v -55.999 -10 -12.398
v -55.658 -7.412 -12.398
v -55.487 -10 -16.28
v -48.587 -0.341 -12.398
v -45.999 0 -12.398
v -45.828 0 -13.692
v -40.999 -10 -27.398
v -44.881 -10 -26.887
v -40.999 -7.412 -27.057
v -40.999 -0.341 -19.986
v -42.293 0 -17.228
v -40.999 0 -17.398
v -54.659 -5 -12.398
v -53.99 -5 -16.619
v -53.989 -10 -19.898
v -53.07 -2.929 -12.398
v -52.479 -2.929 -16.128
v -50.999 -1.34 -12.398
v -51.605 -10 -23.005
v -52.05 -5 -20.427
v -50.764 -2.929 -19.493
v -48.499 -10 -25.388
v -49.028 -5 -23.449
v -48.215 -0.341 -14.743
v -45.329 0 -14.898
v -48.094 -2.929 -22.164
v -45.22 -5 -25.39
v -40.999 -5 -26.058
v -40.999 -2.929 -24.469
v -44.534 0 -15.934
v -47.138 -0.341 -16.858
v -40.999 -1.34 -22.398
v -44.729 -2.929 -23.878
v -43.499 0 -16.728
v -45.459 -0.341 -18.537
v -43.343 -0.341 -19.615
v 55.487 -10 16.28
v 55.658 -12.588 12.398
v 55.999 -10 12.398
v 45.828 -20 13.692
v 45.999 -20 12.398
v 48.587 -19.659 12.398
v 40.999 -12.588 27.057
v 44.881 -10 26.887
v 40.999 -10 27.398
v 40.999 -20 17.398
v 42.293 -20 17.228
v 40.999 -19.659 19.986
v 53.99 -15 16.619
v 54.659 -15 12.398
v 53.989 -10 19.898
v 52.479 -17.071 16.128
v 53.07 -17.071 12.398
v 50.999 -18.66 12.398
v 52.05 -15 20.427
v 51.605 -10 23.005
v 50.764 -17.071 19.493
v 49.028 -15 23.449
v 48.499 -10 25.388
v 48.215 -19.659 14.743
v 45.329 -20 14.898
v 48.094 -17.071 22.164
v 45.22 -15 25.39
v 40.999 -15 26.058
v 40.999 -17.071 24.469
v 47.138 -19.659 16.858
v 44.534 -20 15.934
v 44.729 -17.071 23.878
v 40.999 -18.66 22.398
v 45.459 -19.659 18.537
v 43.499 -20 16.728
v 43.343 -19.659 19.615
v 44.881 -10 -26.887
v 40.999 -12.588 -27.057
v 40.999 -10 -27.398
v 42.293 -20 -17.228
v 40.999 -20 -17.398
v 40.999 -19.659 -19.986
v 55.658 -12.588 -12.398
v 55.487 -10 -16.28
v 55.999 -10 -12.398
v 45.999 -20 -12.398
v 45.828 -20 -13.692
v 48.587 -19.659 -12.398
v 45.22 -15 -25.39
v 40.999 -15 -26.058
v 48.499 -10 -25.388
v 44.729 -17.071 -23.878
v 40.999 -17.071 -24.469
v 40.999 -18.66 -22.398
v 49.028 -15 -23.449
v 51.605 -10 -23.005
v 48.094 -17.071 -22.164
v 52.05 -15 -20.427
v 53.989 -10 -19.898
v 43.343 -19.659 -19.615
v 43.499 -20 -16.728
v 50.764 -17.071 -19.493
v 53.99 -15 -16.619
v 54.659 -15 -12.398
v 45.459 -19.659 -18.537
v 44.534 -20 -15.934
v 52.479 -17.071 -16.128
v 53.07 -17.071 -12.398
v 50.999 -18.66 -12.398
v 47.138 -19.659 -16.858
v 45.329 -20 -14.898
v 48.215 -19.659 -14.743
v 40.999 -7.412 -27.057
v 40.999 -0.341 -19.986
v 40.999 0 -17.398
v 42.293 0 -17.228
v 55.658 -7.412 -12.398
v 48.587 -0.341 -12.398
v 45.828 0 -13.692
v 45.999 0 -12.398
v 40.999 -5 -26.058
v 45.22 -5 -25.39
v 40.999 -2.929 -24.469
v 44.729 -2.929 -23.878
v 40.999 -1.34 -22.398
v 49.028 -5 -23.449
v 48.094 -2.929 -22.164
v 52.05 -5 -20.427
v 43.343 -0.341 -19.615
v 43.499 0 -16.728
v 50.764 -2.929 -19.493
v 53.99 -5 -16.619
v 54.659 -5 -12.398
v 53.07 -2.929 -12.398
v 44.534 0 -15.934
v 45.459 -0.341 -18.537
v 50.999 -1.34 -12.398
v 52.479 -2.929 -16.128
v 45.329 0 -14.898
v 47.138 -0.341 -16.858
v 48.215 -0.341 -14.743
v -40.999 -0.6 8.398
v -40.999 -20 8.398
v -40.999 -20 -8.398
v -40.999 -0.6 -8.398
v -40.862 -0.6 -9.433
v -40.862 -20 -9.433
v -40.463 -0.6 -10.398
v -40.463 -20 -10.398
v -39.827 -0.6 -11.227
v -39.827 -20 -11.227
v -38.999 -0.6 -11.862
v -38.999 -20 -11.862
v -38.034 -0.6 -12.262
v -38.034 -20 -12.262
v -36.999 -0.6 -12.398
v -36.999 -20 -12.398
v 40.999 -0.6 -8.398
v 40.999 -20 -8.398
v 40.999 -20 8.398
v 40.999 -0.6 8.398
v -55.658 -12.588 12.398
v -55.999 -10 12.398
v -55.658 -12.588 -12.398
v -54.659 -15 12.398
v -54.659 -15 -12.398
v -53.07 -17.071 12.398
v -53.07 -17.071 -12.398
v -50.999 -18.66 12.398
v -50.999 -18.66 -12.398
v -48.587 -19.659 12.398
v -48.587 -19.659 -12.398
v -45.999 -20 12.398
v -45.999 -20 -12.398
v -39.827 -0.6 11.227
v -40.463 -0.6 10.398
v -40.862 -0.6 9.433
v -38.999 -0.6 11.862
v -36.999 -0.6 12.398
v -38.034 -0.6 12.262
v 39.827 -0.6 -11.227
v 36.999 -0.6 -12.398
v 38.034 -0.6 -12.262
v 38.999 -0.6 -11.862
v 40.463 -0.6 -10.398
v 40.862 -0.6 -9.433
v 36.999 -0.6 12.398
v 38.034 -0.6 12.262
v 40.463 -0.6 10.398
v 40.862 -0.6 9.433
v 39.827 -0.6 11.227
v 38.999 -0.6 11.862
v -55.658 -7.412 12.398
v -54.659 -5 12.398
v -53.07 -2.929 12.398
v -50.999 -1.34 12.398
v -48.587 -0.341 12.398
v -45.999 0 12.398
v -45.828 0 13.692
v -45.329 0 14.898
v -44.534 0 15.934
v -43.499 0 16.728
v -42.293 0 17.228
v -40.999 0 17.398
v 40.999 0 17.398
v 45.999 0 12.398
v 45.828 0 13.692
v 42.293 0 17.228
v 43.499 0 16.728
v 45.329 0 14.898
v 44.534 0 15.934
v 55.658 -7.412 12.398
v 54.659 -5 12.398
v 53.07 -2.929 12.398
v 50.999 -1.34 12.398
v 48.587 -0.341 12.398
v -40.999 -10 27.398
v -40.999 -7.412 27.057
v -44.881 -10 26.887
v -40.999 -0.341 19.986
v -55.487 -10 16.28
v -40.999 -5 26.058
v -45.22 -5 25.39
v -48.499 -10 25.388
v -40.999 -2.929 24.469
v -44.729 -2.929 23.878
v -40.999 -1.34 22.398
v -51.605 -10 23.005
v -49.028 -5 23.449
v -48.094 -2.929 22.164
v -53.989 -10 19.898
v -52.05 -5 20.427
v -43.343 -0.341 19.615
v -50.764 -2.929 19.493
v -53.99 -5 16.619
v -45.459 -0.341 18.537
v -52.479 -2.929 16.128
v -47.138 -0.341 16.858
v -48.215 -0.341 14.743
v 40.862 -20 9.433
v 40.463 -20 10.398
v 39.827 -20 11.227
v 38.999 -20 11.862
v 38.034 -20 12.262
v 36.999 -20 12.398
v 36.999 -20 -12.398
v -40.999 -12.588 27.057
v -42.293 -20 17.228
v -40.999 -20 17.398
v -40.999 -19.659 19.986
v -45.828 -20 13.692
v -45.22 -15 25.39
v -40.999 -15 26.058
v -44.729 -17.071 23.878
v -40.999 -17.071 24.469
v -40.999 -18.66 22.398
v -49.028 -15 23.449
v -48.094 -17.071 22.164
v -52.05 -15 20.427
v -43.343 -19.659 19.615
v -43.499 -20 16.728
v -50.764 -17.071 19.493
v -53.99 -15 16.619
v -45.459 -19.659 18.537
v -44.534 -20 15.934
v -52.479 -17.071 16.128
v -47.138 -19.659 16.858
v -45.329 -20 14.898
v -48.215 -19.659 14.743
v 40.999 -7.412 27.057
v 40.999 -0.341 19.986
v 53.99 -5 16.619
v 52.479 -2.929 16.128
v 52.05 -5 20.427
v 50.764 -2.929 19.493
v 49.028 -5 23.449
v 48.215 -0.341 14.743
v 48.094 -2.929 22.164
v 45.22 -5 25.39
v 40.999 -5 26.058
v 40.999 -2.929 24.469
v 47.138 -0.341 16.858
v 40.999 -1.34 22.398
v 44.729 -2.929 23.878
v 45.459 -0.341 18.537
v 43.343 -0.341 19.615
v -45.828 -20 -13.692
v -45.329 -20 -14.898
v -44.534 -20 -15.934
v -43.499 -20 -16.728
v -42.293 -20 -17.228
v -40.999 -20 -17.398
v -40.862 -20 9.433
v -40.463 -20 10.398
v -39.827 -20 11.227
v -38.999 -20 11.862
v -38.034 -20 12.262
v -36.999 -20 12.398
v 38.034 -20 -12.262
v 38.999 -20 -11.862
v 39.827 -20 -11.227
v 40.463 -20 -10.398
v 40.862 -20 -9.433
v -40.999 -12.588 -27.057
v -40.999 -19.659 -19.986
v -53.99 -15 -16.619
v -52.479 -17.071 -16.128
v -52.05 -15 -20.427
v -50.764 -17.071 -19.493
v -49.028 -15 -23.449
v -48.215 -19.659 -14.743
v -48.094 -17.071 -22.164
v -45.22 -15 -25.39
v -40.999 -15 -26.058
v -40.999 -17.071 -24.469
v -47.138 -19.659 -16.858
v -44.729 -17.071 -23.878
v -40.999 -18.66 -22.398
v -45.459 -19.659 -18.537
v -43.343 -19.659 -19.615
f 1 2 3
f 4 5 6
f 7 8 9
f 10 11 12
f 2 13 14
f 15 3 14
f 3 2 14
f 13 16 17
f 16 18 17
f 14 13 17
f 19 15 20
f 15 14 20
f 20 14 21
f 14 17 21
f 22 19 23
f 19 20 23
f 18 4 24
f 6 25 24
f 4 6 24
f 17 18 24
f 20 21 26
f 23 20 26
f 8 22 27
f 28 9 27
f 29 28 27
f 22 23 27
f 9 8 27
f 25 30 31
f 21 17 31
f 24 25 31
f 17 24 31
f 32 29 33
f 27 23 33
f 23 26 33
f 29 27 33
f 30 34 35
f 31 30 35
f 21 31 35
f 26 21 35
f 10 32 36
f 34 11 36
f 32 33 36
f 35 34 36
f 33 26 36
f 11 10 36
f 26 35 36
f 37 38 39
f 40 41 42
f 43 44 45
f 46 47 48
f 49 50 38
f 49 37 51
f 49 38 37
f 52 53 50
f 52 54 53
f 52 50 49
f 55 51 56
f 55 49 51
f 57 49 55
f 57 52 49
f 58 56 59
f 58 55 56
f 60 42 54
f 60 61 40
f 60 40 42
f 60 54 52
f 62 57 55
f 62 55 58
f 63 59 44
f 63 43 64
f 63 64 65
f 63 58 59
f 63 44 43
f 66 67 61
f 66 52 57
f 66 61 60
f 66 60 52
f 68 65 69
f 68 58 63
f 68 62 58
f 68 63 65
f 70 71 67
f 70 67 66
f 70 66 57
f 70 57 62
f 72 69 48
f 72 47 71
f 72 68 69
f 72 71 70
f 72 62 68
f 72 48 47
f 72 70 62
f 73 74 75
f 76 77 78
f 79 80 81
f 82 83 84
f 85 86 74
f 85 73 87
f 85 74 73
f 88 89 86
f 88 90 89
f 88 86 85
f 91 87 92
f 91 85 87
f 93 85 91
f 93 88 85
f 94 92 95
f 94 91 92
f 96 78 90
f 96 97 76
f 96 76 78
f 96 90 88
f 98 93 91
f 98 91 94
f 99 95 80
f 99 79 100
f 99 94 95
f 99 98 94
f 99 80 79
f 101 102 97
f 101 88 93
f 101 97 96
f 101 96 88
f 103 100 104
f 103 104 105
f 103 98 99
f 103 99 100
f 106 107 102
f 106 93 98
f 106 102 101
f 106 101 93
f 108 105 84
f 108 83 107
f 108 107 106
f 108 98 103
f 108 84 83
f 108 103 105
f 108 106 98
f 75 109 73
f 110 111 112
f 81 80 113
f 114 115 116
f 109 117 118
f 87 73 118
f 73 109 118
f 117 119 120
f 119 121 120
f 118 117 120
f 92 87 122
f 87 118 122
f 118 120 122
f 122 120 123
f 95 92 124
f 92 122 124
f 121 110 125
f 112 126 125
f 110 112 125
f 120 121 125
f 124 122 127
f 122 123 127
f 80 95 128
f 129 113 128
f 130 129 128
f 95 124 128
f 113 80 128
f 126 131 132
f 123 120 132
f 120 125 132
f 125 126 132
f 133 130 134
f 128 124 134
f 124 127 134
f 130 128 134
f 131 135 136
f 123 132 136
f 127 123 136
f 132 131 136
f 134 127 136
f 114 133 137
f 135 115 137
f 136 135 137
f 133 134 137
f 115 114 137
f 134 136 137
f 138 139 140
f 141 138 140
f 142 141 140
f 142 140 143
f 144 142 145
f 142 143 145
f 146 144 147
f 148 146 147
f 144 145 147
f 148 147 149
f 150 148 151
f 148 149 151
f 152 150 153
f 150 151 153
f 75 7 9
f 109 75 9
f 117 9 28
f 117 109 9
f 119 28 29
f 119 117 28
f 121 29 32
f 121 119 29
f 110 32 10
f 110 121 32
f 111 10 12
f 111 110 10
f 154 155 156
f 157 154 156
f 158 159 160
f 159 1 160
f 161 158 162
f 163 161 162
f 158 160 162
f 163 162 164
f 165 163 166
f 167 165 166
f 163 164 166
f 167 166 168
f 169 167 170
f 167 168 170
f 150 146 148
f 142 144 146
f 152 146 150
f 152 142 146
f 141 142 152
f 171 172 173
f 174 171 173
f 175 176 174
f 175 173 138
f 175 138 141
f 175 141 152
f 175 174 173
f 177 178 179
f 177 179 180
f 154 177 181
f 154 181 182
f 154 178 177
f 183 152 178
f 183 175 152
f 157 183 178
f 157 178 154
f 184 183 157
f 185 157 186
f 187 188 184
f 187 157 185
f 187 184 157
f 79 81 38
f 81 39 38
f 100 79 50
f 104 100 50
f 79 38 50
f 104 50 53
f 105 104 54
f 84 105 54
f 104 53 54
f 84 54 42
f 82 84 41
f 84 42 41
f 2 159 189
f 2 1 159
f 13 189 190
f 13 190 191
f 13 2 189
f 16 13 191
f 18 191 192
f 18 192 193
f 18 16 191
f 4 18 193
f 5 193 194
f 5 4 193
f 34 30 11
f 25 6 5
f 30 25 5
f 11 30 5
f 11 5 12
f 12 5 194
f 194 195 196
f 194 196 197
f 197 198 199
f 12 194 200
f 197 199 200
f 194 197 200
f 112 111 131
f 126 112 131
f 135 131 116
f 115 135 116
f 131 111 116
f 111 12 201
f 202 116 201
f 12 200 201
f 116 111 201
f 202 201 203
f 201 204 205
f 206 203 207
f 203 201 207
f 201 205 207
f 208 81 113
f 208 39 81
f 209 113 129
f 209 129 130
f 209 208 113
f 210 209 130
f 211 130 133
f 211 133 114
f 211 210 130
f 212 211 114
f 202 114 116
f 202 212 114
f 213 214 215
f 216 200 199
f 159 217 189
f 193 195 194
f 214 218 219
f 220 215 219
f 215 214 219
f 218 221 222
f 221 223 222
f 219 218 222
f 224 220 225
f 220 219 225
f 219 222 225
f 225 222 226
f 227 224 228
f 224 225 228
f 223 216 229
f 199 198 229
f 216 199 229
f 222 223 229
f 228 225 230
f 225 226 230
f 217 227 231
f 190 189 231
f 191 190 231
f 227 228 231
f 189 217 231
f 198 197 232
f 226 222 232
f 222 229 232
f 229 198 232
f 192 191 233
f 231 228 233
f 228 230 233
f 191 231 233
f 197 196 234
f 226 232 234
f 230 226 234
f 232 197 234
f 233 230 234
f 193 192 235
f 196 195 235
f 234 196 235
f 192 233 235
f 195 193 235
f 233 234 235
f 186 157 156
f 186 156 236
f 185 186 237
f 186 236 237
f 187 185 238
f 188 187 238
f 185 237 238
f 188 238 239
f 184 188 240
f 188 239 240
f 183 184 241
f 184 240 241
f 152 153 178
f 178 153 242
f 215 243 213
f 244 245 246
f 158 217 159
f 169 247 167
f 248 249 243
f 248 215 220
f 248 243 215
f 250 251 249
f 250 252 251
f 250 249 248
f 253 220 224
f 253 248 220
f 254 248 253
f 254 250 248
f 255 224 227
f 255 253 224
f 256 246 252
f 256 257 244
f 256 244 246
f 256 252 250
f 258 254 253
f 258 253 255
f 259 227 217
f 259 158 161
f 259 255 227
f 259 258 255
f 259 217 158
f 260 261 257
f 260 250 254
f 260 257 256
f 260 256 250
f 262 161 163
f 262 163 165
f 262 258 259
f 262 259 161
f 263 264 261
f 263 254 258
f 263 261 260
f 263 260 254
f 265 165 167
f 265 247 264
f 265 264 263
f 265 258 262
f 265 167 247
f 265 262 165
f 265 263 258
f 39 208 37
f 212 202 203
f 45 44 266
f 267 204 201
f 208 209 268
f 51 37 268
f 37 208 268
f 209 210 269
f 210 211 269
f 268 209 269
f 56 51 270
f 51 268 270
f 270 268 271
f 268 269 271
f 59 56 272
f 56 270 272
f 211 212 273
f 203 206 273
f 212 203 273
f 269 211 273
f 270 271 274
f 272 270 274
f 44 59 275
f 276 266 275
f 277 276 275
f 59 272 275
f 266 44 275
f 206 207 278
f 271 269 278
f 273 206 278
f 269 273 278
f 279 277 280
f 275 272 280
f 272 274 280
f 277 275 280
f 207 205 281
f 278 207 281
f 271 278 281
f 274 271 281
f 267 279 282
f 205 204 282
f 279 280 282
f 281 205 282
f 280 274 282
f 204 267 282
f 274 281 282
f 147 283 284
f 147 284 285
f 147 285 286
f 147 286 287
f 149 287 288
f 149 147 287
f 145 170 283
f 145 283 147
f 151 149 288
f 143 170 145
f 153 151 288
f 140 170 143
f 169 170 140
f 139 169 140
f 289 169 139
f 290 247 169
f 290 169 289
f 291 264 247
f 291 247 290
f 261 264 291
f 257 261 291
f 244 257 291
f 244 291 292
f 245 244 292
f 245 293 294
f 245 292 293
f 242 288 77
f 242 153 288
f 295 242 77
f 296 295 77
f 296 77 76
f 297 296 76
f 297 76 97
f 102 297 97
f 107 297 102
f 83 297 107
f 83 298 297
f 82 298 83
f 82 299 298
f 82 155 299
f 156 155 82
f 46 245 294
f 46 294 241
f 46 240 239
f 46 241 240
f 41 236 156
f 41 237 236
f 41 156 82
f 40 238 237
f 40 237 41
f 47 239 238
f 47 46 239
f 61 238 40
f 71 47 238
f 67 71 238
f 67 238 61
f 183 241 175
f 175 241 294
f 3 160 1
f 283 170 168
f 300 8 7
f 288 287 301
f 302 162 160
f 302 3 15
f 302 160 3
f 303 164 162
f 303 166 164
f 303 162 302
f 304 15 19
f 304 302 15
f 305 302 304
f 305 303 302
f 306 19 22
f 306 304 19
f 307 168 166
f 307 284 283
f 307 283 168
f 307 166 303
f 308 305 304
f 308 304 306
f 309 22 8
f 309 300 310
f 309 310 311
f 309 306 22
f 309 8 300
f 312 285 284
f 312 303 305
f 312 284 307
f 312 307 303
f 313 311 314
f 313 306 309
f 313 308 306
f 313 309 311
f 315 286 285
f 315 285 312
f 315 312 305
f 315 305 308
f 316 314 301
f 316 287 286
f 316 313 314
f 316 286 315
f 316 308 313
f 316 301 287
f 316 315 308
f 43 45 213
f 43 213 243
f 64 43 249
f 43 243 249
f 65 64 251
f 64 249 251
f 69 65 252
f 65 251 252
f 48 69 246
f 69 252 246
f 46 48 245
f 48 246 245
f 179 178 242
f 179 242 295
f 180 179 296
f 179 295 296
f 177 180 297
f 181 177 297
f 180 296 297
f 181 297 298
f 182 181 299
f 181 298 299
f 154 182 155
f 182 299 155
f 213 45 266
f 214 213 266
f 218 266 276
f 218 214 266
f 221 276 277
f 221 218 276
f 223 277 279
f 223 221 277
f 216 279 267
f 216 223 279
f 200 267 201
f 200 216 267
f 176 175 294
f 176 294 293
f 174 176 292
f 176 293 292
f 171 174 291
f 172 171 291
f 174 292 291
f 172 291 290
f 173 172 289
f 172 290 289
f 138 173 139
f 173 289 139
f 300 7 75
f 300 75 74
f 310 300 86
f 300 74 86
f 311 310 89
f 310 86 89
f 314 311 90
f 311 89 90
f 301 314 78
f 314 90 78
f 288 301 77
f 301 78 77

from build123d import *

# Parameters (mm, degrees)
F1_DEPTH = 20
F2_R     = 9.99999
F4_DEPTH = 19.4


# Not quite as in the source:
# - a fillet or chamfer is up to 0.001 mm smaller than in the source, because OpenCascade refuses the exact size


with BuildPart() as f1:
    # F0 (on Front) → F1 (new body)
    with BuildSketch(Plane.XZ):
        with BuildLine():
            ThreePointArc((55.998519063, 12.3981075734), (51.6051207808, 23.0047092912), (40.998519063, 27.3981075734))
            Line((40.998519063, 27.3981075734), (-40.998519063, 27.3981075734))
            ThreePointArc((-40.998519063, 27.3981075734), (-51.6051207808, 23.0047092912), (-55.998519063, 12.3981075734))
            Line((-55.998519063, 12.3981075734), (-55.998519063, -12.3981075734))
            ThreePointArc((-55.998519063, -12.3981075734), (-51.6051207808, -23.0047092912), (-40.998519063, -27.3981075734))
            Line((-40.998519063, -27.3981075734), (40.998519063, -27.3981075734))
            ThreePointArc((40.998519063, -27.3981075734), (51.6051207808, -23.0047092912), (55.998519063, -12.3981075734))
            Line((55.998519063, -12.3981075734), (55.998519063, 12.3981075734))
        make_face()
    extrude(amount=F1_DEPTH)

    # F2 (radius 10 in the source; OpenCascade refuses exactly that, so slightly less here)
    f2_edges = [f1.edges().sort_by_distance(p)[0] for p in [
        (55.998519, -20, 0),
        (51.605121, -20, 23.004709),
        (0, -20, 27.398108),
        (-51.605121, -20, 23.004709),
        (-55.998519, -20, 0),
        (-51.605121, -20, -23.004709),
        (0, -20, -27.398108),
        (51.605121, -20, -23.004709),
        (0, 0, 27.398108),
    ]]
    fillet(f2_edges, radius=F2_R)

    # F3 (on face) → F4 (cut)
    with BuildSketch(Plane.XZ.offset(20)):
        with BuildLine():
            ThreePointArc((-40.998519063, -8.3981075734), (-39.8269461877, -11.2265346981), (-36.998519063, -12.3981075734))
            Line((-36.998519063, -12.3981075734), (36.998519063, -12.3981075734))
            ThreePointArc((36.998519063, -12.3981075734), (39.8269461877, -11.2265346981), (40.998519063, -8.3981075734))
            Line((40.998519063, -8.3981075734), (40.998519063, 8.3981075734))
            ThreePointArc((40.998519063, 8.3981075734), (39.8269461877, 11.2265346981), (36.998519063, 12.3981075734))
            Line((36.998519063, 12.3981075734), (-36.998519063, 12.3981075734))
            ThreePointArc((-36.998519063, 12.3981075734), (-39.8269461877, 11.2265346981), (-40.998519063, 8.3981075734))
            Line((-40.998519063, 8.3981075734), (-40.998519063, -8.3981075734))
        make_face()
    extrude(amount=-F4_DEPTH, mode=Mode.SUBTRACT)


solid = f1.part
